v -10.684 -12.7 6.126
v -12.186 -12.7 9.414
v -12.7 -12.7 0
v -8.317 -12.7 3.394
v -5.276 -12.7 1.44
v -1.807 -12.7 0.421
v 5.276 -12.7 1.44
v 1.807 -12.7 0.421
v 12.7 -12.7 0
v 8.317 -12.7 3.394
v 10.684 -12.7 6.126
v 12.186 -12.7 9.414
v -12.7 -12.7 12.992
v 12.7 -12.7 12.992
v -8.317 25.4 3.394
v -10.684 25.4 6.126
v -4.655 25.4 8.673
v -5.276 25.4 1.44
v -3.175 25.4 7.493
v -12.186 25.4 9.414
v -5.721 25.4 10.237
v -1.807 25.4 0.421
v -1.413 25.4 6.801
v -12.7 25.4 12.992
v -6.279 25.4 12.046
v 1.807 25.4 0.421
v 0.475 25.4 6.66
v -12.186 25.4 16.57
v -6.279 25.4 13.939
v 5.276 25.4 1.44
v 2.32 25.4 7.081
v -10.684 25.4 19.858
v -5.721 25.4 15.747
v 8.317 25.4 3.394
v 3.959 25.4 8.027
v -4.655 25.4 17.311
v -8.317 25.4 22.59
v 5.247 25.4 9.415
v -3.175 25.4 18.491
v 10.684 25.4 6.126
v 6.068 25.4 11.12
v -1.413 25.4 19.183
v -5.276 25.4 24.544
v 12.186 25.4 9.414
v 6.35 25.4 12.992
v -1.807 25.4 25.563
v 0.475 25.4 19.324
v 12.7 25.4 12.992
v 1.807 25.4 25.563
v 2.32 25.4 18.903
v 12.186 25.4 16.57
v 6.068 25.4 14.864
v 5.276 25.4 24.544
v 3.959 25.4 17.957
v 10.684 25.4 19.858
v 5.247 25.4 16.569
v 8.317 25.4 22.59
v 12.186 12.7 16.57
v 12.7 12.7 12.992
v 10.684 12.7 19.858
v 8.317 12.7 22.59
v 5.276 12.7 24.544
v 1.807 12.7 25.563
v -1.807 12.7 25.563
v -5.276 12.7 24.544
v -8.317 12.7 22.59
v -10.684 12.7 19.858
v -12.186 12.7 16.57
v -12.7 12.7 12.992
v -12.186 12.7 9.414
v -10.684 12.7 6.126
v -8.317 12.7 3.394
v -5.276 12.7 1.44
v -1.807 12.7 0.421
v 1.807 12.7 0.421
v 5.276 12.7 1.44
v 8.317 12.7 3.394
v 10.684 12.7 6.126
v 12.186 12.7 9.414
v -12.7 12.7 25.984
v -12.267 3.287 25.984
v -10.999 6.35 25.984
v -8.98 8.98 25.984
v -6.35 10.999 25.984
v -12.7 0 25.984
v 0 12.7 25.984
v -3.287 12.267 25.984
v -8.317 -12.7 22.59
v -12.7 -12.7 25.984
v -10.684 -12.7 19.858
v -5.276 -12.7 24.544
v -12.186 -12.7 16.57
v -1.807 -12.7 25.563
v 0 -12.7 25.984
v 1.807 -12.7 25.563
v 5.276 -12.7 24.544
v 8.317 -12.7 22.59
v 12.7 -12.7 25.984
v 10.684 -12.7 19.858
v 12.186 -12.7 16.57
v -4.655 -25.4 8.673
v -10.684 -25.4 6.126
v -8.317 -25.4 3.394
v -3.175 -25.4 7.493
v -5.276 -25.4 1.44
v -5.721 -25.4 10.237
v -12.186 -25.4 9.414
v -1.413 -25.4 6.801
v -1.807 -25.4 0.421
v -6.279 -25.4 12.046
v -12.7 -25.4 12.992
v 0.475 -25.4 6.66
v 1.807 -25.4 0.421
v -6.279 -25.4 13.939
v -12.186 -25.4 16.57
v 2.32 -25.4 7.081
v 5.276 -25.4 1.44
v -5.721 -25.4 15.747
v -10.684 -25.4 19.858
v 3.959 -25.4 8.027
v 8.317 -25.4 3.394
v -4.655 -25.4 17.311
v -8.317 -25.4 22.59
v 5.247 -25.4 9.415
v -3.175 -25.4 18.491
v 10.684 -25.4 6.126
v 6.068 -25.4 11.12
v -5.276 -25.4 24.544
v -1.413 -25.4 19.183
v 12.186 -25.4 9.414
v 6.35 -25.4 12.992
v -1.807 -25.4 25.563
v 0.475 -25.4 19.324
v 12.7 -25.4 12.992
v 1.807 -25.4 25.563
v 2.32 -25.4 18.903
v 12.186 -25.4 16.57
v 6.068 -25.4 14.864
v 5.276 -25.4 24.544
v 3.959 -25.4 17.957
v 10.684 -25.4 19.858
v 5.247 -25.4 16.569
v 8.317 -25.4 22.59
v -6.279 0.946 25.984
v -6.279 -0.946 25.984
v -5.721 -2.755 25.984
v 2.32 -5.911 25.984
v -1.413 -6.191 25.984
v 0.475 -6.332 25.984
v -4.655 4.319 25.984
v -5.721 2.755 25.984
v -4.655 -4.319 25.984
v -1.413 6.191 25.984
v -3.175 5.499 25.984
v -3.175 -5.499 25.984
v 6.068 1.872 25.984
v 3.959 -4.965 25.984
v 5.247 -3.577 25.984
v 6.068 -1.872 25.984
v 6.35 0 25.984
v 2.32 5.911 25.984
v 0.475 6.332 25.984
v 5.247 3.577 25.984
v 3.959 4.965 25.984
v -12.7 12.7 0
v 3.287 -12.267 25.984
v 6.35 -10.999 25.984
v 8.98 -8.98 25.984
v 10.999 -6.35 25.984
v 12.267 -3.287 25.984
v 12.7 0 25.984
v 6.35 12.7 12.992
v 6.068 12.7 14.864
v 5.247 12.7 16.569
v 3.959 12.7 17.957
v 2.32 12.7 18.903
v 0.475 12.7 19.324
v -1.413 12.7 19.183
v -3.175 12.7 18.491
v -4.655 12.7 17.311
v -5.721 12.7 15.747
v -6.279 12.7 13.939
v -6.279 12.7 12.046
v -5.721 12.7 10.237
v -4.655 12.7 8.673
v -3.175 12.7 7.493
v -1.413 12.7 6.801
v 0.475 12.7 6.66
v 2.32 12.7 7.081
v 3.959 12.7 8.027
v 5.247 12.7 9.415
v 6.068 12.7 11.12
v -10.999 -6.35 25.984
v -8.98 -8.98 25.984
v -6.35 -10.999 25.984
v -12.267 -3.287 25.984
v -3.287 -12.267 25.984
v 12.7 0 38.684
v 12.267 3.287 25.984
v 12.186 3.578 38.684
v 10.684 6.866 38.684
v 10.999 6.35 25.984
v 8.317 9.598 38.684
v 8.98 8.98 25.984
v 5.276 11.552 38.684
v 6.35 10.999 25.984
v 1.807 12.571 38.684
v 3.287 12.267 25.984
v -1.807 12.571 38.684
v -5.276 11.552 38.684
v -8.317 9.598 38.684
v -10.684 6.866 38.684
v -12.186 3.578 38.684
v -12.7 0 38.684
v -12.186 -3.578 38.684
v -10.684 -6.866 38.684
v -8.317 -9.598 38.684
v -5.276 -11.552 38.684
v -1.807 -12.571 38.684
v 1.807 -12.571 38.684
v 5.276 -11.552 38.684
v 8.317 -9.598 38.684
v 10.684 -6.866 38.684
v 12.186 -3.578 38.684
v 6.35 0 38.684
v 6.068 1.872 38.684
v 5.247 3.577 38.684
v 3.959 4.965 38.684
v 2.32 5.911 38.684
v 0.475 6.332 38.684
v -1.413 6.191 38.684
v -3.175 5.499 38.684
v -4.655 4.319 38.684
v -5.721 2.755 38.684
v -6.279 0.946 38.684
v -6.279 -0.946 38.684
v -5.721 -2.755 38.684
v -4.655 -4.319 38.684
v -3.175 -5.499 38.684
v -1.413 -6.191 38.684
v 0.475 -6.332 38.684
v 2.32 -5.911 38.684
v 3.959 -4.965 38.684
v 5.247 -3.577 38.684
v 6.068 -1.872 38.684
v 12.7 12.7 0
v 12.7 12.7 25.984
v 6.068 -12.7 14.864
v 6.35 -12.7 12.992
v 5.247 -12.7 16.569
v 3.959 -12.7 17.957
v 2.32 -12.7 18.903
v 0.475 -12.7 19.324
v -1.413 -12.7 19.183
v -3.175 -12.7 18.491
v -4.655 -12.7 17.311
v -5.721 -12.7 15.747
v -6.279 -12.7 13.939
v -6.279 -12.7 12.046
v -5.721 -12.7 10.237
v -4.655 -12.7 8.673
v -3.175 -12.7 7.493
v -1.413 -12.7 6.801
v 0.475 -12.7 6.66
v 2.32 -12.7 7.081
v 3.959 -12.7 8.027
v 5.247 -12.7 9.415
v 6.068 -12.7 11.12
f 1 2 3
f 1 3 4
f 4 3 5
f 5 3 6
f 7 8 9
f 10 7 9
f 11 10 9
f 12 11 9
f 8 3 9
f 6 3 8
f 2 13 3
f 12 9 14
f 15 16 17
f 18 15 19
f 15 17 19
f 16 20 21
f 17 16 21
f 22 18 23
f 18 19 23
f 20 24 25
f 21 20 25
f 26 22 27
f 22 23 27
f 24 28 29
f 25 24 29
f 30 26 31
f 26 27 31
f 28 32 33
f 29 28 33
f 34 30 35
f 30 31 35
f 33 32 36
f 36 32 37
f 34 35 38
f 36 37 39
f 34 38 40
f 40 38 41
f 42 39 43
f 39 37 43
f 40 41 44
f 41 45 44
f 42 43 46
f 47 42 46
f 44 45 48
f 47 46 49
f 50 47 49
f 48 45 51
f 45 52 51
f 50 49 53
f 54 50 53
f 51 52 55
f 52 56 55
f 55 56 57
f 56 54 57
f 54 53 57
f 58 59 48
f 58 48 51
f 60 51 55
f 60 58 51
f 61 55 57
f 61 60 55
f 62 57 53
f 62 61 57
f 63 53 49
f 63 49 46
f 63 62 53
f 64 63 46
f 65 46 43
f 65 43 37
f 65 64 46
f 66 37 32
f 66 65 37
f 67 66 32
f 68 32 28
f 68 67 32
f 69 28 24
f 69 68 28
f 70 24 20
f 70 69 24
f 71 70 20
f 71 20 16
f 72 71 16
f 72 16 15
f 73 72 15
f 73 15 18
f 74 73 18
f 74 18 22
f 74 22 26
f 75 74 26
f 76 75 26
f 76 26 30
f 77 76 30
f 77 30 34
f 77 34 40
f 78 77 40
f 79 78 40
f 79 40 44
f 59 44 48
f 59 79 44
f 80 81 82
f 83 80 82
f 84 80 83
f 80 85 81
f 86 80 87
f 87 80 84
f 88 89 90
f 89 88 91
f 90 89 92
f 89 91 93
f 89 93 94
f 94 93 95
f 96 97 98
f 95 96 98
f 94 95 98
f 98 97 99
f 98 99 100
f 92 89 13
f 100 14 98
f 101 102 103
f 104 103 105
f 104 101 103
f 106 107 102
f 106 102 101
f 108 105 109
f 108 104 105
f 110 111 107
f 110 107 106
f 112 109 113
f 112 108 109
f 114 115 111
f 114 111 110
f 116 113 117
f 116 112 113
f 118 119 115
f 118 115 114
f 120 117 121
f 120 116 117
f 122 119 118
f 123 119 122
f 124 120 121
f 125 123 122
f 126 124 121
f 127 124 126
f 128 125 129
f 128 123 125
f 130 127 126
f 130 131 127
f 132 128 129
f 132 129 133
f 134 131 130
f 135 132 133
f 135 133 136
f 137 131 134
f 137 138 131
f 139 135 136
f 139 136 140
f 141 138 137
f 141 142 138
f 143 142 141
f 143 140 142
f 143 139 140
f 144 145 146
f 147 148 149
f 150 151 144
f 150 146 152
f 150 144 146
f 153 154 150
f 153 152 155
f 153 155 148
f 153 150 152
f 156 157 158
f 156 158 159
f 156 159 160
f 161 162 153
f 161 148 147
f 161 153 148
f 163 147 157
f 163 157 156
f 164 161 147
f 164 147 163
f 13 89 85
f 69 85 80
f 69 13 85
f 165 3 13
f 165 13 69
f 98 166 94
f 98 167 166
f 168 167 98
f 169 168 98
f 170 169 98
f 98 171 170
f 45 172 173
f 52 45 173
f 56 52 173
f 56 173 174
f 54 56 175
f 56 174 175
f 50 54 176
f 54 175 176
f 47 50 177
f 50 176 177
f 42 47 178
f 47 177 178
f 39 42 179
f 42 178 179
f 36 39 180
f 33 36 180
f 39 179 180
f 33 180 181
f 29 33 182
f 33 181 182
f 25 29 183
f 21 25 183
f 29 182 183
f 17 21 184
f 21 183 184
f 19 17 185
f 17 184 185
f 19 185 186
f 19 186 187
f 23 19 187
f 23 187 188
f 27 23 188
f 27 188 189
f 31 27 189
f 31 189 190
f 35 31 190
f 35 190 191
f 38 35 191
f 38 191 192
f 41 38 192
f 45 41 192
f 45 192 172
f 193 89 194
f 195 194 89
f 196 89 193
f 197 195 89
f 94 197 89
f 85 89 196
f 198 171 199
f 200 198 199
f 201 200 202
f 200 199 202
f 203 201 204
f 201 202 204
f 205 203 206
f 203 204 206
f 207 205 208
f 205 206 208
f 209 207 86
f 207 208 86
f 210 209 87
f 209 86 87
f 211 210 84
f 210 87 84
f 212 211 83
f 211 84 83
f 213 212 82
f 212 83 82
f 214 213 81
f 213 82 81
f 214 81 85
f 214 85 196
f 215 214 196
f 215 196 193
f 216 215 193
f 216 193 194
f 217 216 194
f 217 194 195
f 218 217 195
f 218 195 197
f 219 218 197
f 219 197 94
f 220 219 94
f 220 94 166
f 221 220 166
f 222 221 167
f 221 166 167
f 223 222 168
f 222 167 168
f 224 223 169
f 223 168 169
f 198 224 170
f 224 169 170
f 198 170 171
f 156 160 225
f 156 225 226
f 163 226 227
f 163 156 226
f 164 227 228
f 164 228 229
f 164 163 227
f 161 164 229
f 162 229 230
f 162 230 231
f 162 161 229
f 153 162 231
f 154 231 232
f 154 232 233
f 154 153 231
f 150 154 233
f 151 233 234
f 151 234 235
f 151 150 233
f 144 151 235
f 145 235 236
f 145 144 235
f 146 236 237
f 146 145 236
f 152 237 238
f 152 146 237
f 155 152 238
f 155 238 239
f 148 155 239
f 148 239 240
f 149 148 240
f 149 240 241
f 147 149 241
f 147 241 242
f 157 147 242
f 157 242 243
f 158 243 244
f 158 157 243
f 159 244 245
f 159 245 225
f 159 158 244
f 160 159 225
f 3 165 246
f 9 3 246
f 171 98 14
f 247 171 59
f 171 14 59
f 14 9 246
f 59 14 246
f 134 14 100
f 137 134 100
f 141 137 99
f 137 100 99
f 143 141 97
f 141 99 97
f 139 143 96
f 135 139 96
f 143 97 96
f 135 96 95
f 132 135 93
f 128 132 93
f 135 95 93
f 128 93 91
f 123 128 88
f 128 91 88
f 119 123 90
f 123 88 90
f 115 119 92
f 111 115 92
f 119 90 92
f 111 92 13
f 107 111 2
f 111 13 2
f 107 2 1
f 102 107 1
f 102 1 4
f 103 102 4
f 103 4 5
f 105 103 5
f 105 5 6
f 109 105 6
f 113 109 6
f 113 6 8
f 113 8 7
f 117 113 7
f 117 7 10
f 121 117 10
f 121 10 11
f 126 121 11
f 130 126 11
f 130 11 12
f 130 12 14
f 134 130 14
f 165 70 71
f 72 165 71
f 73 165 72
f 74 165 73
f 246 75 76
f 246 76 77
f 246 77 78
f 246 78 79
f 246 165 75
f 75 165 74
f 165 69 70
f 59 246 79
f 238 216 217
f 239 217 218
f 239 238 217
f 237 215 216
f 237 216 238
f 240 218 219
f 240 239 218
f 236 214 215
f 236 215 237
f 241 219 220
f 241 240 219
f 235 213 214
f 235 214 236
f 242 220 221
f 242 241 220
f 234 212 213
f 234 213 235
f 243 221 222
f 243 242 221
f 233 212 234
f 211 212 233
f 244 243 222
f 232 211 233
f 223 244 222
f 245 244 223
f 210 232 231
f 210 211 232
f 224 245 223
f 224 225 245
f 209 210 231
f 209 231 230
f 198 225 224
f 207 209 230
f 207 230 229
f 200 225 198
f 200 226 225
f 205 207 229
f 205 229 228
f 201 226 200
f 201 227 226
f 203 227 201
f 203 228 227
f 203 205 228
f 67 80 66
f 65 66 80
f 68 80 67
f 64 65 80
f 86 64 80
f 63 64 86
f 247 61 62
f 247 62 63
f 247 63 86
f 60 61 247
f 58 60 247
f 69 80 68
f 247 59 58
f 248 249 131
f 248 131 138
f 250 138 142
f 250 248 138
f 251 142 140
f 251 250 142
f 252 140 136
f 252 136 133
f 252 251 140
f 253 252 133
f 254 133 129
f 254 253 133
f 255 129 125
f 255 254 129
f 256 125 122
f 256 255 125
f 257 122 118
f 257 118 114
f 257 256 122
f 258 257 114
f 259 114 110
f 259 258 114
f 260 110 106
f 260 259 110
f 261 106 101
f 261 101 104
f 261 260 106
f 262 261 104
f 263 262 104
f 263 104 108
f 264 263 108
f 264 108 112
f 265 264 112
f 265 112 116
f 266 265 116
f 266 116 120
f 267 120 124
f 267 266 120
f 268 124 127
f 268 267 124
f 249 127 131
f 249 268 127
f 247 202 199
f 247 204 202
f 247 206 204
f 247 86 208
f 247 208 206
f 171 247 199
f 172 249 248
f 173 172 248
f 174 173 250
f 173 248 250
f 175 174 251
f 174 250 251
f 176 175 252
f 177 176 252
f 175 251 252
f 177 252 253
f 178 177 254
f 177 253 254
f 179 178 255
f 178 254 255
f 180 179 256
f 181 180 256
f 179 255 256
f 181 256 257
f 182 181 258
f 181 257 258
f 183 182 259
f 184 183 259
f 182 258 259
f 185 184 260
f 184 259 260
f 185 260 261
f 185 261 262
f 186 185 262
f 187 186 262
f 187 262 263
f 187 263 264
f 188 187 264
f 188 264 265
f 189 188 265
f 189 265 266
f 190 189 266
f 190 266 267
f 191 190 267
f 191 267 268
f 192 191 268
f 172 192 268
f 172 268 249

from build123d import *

# Parameters (mm, degrees)
F0_W          = 25.4
F0_H          = 25.4
F1_DEPTH      = 25.9842
F2_R          = 12.7
F2_R_2        = 6.35
F3_DEPTH      = 12.7
F4_R          = 12.7
F4_R_2        = 6.35
F5_DEPTH      = 12.7
F5_DEPTH_BACK = 38.1
F6_R          = 6.35
F7_DEPTH      = 38.101


with BuildPart() as f1:
    # F0 (on Top) → F1 (new body)
    with BuildSketch(Plane.XY):
        Rectangle(F0_W, F0_H)
    extrude(amount=F1_DEPTH)

    # F2 (on face) → F3 (join)
    with BuildSketch(Plane.XY.offset(25.9842)):
        Circle(F2_R)
        Circle(F2_R_2, mode=Mode.SUBTRACT)
    extrude(amount=F3_DEPTH)

    # F4 (on face) → F5 (join, two sides)
    with BuildSketch(Plane.XZ.offset(12.7)) as f5_sk:
        with Locations((0, 12.9921)):
            Circle(F4_R)
        with Locations((0, 12.9921)):
            Circle(F4_R_2, mode=Mode.SUBTRACT)
    extrude(amount=F5_DEPTH)
    extrude(f5_sk.sketch, amount=-F5_DEPTH_BACK)

    # F6 (on face) → F7 (cut, through all)
    with BuildSketch(Plane.XZ.offset(12.7)):
        with Locations((0, 12.9921)):
            Circle(F6_R)
    extrude(amount=-F7_DEPTH, mode=Mode.SUBTRACT)


solid = f1.part
